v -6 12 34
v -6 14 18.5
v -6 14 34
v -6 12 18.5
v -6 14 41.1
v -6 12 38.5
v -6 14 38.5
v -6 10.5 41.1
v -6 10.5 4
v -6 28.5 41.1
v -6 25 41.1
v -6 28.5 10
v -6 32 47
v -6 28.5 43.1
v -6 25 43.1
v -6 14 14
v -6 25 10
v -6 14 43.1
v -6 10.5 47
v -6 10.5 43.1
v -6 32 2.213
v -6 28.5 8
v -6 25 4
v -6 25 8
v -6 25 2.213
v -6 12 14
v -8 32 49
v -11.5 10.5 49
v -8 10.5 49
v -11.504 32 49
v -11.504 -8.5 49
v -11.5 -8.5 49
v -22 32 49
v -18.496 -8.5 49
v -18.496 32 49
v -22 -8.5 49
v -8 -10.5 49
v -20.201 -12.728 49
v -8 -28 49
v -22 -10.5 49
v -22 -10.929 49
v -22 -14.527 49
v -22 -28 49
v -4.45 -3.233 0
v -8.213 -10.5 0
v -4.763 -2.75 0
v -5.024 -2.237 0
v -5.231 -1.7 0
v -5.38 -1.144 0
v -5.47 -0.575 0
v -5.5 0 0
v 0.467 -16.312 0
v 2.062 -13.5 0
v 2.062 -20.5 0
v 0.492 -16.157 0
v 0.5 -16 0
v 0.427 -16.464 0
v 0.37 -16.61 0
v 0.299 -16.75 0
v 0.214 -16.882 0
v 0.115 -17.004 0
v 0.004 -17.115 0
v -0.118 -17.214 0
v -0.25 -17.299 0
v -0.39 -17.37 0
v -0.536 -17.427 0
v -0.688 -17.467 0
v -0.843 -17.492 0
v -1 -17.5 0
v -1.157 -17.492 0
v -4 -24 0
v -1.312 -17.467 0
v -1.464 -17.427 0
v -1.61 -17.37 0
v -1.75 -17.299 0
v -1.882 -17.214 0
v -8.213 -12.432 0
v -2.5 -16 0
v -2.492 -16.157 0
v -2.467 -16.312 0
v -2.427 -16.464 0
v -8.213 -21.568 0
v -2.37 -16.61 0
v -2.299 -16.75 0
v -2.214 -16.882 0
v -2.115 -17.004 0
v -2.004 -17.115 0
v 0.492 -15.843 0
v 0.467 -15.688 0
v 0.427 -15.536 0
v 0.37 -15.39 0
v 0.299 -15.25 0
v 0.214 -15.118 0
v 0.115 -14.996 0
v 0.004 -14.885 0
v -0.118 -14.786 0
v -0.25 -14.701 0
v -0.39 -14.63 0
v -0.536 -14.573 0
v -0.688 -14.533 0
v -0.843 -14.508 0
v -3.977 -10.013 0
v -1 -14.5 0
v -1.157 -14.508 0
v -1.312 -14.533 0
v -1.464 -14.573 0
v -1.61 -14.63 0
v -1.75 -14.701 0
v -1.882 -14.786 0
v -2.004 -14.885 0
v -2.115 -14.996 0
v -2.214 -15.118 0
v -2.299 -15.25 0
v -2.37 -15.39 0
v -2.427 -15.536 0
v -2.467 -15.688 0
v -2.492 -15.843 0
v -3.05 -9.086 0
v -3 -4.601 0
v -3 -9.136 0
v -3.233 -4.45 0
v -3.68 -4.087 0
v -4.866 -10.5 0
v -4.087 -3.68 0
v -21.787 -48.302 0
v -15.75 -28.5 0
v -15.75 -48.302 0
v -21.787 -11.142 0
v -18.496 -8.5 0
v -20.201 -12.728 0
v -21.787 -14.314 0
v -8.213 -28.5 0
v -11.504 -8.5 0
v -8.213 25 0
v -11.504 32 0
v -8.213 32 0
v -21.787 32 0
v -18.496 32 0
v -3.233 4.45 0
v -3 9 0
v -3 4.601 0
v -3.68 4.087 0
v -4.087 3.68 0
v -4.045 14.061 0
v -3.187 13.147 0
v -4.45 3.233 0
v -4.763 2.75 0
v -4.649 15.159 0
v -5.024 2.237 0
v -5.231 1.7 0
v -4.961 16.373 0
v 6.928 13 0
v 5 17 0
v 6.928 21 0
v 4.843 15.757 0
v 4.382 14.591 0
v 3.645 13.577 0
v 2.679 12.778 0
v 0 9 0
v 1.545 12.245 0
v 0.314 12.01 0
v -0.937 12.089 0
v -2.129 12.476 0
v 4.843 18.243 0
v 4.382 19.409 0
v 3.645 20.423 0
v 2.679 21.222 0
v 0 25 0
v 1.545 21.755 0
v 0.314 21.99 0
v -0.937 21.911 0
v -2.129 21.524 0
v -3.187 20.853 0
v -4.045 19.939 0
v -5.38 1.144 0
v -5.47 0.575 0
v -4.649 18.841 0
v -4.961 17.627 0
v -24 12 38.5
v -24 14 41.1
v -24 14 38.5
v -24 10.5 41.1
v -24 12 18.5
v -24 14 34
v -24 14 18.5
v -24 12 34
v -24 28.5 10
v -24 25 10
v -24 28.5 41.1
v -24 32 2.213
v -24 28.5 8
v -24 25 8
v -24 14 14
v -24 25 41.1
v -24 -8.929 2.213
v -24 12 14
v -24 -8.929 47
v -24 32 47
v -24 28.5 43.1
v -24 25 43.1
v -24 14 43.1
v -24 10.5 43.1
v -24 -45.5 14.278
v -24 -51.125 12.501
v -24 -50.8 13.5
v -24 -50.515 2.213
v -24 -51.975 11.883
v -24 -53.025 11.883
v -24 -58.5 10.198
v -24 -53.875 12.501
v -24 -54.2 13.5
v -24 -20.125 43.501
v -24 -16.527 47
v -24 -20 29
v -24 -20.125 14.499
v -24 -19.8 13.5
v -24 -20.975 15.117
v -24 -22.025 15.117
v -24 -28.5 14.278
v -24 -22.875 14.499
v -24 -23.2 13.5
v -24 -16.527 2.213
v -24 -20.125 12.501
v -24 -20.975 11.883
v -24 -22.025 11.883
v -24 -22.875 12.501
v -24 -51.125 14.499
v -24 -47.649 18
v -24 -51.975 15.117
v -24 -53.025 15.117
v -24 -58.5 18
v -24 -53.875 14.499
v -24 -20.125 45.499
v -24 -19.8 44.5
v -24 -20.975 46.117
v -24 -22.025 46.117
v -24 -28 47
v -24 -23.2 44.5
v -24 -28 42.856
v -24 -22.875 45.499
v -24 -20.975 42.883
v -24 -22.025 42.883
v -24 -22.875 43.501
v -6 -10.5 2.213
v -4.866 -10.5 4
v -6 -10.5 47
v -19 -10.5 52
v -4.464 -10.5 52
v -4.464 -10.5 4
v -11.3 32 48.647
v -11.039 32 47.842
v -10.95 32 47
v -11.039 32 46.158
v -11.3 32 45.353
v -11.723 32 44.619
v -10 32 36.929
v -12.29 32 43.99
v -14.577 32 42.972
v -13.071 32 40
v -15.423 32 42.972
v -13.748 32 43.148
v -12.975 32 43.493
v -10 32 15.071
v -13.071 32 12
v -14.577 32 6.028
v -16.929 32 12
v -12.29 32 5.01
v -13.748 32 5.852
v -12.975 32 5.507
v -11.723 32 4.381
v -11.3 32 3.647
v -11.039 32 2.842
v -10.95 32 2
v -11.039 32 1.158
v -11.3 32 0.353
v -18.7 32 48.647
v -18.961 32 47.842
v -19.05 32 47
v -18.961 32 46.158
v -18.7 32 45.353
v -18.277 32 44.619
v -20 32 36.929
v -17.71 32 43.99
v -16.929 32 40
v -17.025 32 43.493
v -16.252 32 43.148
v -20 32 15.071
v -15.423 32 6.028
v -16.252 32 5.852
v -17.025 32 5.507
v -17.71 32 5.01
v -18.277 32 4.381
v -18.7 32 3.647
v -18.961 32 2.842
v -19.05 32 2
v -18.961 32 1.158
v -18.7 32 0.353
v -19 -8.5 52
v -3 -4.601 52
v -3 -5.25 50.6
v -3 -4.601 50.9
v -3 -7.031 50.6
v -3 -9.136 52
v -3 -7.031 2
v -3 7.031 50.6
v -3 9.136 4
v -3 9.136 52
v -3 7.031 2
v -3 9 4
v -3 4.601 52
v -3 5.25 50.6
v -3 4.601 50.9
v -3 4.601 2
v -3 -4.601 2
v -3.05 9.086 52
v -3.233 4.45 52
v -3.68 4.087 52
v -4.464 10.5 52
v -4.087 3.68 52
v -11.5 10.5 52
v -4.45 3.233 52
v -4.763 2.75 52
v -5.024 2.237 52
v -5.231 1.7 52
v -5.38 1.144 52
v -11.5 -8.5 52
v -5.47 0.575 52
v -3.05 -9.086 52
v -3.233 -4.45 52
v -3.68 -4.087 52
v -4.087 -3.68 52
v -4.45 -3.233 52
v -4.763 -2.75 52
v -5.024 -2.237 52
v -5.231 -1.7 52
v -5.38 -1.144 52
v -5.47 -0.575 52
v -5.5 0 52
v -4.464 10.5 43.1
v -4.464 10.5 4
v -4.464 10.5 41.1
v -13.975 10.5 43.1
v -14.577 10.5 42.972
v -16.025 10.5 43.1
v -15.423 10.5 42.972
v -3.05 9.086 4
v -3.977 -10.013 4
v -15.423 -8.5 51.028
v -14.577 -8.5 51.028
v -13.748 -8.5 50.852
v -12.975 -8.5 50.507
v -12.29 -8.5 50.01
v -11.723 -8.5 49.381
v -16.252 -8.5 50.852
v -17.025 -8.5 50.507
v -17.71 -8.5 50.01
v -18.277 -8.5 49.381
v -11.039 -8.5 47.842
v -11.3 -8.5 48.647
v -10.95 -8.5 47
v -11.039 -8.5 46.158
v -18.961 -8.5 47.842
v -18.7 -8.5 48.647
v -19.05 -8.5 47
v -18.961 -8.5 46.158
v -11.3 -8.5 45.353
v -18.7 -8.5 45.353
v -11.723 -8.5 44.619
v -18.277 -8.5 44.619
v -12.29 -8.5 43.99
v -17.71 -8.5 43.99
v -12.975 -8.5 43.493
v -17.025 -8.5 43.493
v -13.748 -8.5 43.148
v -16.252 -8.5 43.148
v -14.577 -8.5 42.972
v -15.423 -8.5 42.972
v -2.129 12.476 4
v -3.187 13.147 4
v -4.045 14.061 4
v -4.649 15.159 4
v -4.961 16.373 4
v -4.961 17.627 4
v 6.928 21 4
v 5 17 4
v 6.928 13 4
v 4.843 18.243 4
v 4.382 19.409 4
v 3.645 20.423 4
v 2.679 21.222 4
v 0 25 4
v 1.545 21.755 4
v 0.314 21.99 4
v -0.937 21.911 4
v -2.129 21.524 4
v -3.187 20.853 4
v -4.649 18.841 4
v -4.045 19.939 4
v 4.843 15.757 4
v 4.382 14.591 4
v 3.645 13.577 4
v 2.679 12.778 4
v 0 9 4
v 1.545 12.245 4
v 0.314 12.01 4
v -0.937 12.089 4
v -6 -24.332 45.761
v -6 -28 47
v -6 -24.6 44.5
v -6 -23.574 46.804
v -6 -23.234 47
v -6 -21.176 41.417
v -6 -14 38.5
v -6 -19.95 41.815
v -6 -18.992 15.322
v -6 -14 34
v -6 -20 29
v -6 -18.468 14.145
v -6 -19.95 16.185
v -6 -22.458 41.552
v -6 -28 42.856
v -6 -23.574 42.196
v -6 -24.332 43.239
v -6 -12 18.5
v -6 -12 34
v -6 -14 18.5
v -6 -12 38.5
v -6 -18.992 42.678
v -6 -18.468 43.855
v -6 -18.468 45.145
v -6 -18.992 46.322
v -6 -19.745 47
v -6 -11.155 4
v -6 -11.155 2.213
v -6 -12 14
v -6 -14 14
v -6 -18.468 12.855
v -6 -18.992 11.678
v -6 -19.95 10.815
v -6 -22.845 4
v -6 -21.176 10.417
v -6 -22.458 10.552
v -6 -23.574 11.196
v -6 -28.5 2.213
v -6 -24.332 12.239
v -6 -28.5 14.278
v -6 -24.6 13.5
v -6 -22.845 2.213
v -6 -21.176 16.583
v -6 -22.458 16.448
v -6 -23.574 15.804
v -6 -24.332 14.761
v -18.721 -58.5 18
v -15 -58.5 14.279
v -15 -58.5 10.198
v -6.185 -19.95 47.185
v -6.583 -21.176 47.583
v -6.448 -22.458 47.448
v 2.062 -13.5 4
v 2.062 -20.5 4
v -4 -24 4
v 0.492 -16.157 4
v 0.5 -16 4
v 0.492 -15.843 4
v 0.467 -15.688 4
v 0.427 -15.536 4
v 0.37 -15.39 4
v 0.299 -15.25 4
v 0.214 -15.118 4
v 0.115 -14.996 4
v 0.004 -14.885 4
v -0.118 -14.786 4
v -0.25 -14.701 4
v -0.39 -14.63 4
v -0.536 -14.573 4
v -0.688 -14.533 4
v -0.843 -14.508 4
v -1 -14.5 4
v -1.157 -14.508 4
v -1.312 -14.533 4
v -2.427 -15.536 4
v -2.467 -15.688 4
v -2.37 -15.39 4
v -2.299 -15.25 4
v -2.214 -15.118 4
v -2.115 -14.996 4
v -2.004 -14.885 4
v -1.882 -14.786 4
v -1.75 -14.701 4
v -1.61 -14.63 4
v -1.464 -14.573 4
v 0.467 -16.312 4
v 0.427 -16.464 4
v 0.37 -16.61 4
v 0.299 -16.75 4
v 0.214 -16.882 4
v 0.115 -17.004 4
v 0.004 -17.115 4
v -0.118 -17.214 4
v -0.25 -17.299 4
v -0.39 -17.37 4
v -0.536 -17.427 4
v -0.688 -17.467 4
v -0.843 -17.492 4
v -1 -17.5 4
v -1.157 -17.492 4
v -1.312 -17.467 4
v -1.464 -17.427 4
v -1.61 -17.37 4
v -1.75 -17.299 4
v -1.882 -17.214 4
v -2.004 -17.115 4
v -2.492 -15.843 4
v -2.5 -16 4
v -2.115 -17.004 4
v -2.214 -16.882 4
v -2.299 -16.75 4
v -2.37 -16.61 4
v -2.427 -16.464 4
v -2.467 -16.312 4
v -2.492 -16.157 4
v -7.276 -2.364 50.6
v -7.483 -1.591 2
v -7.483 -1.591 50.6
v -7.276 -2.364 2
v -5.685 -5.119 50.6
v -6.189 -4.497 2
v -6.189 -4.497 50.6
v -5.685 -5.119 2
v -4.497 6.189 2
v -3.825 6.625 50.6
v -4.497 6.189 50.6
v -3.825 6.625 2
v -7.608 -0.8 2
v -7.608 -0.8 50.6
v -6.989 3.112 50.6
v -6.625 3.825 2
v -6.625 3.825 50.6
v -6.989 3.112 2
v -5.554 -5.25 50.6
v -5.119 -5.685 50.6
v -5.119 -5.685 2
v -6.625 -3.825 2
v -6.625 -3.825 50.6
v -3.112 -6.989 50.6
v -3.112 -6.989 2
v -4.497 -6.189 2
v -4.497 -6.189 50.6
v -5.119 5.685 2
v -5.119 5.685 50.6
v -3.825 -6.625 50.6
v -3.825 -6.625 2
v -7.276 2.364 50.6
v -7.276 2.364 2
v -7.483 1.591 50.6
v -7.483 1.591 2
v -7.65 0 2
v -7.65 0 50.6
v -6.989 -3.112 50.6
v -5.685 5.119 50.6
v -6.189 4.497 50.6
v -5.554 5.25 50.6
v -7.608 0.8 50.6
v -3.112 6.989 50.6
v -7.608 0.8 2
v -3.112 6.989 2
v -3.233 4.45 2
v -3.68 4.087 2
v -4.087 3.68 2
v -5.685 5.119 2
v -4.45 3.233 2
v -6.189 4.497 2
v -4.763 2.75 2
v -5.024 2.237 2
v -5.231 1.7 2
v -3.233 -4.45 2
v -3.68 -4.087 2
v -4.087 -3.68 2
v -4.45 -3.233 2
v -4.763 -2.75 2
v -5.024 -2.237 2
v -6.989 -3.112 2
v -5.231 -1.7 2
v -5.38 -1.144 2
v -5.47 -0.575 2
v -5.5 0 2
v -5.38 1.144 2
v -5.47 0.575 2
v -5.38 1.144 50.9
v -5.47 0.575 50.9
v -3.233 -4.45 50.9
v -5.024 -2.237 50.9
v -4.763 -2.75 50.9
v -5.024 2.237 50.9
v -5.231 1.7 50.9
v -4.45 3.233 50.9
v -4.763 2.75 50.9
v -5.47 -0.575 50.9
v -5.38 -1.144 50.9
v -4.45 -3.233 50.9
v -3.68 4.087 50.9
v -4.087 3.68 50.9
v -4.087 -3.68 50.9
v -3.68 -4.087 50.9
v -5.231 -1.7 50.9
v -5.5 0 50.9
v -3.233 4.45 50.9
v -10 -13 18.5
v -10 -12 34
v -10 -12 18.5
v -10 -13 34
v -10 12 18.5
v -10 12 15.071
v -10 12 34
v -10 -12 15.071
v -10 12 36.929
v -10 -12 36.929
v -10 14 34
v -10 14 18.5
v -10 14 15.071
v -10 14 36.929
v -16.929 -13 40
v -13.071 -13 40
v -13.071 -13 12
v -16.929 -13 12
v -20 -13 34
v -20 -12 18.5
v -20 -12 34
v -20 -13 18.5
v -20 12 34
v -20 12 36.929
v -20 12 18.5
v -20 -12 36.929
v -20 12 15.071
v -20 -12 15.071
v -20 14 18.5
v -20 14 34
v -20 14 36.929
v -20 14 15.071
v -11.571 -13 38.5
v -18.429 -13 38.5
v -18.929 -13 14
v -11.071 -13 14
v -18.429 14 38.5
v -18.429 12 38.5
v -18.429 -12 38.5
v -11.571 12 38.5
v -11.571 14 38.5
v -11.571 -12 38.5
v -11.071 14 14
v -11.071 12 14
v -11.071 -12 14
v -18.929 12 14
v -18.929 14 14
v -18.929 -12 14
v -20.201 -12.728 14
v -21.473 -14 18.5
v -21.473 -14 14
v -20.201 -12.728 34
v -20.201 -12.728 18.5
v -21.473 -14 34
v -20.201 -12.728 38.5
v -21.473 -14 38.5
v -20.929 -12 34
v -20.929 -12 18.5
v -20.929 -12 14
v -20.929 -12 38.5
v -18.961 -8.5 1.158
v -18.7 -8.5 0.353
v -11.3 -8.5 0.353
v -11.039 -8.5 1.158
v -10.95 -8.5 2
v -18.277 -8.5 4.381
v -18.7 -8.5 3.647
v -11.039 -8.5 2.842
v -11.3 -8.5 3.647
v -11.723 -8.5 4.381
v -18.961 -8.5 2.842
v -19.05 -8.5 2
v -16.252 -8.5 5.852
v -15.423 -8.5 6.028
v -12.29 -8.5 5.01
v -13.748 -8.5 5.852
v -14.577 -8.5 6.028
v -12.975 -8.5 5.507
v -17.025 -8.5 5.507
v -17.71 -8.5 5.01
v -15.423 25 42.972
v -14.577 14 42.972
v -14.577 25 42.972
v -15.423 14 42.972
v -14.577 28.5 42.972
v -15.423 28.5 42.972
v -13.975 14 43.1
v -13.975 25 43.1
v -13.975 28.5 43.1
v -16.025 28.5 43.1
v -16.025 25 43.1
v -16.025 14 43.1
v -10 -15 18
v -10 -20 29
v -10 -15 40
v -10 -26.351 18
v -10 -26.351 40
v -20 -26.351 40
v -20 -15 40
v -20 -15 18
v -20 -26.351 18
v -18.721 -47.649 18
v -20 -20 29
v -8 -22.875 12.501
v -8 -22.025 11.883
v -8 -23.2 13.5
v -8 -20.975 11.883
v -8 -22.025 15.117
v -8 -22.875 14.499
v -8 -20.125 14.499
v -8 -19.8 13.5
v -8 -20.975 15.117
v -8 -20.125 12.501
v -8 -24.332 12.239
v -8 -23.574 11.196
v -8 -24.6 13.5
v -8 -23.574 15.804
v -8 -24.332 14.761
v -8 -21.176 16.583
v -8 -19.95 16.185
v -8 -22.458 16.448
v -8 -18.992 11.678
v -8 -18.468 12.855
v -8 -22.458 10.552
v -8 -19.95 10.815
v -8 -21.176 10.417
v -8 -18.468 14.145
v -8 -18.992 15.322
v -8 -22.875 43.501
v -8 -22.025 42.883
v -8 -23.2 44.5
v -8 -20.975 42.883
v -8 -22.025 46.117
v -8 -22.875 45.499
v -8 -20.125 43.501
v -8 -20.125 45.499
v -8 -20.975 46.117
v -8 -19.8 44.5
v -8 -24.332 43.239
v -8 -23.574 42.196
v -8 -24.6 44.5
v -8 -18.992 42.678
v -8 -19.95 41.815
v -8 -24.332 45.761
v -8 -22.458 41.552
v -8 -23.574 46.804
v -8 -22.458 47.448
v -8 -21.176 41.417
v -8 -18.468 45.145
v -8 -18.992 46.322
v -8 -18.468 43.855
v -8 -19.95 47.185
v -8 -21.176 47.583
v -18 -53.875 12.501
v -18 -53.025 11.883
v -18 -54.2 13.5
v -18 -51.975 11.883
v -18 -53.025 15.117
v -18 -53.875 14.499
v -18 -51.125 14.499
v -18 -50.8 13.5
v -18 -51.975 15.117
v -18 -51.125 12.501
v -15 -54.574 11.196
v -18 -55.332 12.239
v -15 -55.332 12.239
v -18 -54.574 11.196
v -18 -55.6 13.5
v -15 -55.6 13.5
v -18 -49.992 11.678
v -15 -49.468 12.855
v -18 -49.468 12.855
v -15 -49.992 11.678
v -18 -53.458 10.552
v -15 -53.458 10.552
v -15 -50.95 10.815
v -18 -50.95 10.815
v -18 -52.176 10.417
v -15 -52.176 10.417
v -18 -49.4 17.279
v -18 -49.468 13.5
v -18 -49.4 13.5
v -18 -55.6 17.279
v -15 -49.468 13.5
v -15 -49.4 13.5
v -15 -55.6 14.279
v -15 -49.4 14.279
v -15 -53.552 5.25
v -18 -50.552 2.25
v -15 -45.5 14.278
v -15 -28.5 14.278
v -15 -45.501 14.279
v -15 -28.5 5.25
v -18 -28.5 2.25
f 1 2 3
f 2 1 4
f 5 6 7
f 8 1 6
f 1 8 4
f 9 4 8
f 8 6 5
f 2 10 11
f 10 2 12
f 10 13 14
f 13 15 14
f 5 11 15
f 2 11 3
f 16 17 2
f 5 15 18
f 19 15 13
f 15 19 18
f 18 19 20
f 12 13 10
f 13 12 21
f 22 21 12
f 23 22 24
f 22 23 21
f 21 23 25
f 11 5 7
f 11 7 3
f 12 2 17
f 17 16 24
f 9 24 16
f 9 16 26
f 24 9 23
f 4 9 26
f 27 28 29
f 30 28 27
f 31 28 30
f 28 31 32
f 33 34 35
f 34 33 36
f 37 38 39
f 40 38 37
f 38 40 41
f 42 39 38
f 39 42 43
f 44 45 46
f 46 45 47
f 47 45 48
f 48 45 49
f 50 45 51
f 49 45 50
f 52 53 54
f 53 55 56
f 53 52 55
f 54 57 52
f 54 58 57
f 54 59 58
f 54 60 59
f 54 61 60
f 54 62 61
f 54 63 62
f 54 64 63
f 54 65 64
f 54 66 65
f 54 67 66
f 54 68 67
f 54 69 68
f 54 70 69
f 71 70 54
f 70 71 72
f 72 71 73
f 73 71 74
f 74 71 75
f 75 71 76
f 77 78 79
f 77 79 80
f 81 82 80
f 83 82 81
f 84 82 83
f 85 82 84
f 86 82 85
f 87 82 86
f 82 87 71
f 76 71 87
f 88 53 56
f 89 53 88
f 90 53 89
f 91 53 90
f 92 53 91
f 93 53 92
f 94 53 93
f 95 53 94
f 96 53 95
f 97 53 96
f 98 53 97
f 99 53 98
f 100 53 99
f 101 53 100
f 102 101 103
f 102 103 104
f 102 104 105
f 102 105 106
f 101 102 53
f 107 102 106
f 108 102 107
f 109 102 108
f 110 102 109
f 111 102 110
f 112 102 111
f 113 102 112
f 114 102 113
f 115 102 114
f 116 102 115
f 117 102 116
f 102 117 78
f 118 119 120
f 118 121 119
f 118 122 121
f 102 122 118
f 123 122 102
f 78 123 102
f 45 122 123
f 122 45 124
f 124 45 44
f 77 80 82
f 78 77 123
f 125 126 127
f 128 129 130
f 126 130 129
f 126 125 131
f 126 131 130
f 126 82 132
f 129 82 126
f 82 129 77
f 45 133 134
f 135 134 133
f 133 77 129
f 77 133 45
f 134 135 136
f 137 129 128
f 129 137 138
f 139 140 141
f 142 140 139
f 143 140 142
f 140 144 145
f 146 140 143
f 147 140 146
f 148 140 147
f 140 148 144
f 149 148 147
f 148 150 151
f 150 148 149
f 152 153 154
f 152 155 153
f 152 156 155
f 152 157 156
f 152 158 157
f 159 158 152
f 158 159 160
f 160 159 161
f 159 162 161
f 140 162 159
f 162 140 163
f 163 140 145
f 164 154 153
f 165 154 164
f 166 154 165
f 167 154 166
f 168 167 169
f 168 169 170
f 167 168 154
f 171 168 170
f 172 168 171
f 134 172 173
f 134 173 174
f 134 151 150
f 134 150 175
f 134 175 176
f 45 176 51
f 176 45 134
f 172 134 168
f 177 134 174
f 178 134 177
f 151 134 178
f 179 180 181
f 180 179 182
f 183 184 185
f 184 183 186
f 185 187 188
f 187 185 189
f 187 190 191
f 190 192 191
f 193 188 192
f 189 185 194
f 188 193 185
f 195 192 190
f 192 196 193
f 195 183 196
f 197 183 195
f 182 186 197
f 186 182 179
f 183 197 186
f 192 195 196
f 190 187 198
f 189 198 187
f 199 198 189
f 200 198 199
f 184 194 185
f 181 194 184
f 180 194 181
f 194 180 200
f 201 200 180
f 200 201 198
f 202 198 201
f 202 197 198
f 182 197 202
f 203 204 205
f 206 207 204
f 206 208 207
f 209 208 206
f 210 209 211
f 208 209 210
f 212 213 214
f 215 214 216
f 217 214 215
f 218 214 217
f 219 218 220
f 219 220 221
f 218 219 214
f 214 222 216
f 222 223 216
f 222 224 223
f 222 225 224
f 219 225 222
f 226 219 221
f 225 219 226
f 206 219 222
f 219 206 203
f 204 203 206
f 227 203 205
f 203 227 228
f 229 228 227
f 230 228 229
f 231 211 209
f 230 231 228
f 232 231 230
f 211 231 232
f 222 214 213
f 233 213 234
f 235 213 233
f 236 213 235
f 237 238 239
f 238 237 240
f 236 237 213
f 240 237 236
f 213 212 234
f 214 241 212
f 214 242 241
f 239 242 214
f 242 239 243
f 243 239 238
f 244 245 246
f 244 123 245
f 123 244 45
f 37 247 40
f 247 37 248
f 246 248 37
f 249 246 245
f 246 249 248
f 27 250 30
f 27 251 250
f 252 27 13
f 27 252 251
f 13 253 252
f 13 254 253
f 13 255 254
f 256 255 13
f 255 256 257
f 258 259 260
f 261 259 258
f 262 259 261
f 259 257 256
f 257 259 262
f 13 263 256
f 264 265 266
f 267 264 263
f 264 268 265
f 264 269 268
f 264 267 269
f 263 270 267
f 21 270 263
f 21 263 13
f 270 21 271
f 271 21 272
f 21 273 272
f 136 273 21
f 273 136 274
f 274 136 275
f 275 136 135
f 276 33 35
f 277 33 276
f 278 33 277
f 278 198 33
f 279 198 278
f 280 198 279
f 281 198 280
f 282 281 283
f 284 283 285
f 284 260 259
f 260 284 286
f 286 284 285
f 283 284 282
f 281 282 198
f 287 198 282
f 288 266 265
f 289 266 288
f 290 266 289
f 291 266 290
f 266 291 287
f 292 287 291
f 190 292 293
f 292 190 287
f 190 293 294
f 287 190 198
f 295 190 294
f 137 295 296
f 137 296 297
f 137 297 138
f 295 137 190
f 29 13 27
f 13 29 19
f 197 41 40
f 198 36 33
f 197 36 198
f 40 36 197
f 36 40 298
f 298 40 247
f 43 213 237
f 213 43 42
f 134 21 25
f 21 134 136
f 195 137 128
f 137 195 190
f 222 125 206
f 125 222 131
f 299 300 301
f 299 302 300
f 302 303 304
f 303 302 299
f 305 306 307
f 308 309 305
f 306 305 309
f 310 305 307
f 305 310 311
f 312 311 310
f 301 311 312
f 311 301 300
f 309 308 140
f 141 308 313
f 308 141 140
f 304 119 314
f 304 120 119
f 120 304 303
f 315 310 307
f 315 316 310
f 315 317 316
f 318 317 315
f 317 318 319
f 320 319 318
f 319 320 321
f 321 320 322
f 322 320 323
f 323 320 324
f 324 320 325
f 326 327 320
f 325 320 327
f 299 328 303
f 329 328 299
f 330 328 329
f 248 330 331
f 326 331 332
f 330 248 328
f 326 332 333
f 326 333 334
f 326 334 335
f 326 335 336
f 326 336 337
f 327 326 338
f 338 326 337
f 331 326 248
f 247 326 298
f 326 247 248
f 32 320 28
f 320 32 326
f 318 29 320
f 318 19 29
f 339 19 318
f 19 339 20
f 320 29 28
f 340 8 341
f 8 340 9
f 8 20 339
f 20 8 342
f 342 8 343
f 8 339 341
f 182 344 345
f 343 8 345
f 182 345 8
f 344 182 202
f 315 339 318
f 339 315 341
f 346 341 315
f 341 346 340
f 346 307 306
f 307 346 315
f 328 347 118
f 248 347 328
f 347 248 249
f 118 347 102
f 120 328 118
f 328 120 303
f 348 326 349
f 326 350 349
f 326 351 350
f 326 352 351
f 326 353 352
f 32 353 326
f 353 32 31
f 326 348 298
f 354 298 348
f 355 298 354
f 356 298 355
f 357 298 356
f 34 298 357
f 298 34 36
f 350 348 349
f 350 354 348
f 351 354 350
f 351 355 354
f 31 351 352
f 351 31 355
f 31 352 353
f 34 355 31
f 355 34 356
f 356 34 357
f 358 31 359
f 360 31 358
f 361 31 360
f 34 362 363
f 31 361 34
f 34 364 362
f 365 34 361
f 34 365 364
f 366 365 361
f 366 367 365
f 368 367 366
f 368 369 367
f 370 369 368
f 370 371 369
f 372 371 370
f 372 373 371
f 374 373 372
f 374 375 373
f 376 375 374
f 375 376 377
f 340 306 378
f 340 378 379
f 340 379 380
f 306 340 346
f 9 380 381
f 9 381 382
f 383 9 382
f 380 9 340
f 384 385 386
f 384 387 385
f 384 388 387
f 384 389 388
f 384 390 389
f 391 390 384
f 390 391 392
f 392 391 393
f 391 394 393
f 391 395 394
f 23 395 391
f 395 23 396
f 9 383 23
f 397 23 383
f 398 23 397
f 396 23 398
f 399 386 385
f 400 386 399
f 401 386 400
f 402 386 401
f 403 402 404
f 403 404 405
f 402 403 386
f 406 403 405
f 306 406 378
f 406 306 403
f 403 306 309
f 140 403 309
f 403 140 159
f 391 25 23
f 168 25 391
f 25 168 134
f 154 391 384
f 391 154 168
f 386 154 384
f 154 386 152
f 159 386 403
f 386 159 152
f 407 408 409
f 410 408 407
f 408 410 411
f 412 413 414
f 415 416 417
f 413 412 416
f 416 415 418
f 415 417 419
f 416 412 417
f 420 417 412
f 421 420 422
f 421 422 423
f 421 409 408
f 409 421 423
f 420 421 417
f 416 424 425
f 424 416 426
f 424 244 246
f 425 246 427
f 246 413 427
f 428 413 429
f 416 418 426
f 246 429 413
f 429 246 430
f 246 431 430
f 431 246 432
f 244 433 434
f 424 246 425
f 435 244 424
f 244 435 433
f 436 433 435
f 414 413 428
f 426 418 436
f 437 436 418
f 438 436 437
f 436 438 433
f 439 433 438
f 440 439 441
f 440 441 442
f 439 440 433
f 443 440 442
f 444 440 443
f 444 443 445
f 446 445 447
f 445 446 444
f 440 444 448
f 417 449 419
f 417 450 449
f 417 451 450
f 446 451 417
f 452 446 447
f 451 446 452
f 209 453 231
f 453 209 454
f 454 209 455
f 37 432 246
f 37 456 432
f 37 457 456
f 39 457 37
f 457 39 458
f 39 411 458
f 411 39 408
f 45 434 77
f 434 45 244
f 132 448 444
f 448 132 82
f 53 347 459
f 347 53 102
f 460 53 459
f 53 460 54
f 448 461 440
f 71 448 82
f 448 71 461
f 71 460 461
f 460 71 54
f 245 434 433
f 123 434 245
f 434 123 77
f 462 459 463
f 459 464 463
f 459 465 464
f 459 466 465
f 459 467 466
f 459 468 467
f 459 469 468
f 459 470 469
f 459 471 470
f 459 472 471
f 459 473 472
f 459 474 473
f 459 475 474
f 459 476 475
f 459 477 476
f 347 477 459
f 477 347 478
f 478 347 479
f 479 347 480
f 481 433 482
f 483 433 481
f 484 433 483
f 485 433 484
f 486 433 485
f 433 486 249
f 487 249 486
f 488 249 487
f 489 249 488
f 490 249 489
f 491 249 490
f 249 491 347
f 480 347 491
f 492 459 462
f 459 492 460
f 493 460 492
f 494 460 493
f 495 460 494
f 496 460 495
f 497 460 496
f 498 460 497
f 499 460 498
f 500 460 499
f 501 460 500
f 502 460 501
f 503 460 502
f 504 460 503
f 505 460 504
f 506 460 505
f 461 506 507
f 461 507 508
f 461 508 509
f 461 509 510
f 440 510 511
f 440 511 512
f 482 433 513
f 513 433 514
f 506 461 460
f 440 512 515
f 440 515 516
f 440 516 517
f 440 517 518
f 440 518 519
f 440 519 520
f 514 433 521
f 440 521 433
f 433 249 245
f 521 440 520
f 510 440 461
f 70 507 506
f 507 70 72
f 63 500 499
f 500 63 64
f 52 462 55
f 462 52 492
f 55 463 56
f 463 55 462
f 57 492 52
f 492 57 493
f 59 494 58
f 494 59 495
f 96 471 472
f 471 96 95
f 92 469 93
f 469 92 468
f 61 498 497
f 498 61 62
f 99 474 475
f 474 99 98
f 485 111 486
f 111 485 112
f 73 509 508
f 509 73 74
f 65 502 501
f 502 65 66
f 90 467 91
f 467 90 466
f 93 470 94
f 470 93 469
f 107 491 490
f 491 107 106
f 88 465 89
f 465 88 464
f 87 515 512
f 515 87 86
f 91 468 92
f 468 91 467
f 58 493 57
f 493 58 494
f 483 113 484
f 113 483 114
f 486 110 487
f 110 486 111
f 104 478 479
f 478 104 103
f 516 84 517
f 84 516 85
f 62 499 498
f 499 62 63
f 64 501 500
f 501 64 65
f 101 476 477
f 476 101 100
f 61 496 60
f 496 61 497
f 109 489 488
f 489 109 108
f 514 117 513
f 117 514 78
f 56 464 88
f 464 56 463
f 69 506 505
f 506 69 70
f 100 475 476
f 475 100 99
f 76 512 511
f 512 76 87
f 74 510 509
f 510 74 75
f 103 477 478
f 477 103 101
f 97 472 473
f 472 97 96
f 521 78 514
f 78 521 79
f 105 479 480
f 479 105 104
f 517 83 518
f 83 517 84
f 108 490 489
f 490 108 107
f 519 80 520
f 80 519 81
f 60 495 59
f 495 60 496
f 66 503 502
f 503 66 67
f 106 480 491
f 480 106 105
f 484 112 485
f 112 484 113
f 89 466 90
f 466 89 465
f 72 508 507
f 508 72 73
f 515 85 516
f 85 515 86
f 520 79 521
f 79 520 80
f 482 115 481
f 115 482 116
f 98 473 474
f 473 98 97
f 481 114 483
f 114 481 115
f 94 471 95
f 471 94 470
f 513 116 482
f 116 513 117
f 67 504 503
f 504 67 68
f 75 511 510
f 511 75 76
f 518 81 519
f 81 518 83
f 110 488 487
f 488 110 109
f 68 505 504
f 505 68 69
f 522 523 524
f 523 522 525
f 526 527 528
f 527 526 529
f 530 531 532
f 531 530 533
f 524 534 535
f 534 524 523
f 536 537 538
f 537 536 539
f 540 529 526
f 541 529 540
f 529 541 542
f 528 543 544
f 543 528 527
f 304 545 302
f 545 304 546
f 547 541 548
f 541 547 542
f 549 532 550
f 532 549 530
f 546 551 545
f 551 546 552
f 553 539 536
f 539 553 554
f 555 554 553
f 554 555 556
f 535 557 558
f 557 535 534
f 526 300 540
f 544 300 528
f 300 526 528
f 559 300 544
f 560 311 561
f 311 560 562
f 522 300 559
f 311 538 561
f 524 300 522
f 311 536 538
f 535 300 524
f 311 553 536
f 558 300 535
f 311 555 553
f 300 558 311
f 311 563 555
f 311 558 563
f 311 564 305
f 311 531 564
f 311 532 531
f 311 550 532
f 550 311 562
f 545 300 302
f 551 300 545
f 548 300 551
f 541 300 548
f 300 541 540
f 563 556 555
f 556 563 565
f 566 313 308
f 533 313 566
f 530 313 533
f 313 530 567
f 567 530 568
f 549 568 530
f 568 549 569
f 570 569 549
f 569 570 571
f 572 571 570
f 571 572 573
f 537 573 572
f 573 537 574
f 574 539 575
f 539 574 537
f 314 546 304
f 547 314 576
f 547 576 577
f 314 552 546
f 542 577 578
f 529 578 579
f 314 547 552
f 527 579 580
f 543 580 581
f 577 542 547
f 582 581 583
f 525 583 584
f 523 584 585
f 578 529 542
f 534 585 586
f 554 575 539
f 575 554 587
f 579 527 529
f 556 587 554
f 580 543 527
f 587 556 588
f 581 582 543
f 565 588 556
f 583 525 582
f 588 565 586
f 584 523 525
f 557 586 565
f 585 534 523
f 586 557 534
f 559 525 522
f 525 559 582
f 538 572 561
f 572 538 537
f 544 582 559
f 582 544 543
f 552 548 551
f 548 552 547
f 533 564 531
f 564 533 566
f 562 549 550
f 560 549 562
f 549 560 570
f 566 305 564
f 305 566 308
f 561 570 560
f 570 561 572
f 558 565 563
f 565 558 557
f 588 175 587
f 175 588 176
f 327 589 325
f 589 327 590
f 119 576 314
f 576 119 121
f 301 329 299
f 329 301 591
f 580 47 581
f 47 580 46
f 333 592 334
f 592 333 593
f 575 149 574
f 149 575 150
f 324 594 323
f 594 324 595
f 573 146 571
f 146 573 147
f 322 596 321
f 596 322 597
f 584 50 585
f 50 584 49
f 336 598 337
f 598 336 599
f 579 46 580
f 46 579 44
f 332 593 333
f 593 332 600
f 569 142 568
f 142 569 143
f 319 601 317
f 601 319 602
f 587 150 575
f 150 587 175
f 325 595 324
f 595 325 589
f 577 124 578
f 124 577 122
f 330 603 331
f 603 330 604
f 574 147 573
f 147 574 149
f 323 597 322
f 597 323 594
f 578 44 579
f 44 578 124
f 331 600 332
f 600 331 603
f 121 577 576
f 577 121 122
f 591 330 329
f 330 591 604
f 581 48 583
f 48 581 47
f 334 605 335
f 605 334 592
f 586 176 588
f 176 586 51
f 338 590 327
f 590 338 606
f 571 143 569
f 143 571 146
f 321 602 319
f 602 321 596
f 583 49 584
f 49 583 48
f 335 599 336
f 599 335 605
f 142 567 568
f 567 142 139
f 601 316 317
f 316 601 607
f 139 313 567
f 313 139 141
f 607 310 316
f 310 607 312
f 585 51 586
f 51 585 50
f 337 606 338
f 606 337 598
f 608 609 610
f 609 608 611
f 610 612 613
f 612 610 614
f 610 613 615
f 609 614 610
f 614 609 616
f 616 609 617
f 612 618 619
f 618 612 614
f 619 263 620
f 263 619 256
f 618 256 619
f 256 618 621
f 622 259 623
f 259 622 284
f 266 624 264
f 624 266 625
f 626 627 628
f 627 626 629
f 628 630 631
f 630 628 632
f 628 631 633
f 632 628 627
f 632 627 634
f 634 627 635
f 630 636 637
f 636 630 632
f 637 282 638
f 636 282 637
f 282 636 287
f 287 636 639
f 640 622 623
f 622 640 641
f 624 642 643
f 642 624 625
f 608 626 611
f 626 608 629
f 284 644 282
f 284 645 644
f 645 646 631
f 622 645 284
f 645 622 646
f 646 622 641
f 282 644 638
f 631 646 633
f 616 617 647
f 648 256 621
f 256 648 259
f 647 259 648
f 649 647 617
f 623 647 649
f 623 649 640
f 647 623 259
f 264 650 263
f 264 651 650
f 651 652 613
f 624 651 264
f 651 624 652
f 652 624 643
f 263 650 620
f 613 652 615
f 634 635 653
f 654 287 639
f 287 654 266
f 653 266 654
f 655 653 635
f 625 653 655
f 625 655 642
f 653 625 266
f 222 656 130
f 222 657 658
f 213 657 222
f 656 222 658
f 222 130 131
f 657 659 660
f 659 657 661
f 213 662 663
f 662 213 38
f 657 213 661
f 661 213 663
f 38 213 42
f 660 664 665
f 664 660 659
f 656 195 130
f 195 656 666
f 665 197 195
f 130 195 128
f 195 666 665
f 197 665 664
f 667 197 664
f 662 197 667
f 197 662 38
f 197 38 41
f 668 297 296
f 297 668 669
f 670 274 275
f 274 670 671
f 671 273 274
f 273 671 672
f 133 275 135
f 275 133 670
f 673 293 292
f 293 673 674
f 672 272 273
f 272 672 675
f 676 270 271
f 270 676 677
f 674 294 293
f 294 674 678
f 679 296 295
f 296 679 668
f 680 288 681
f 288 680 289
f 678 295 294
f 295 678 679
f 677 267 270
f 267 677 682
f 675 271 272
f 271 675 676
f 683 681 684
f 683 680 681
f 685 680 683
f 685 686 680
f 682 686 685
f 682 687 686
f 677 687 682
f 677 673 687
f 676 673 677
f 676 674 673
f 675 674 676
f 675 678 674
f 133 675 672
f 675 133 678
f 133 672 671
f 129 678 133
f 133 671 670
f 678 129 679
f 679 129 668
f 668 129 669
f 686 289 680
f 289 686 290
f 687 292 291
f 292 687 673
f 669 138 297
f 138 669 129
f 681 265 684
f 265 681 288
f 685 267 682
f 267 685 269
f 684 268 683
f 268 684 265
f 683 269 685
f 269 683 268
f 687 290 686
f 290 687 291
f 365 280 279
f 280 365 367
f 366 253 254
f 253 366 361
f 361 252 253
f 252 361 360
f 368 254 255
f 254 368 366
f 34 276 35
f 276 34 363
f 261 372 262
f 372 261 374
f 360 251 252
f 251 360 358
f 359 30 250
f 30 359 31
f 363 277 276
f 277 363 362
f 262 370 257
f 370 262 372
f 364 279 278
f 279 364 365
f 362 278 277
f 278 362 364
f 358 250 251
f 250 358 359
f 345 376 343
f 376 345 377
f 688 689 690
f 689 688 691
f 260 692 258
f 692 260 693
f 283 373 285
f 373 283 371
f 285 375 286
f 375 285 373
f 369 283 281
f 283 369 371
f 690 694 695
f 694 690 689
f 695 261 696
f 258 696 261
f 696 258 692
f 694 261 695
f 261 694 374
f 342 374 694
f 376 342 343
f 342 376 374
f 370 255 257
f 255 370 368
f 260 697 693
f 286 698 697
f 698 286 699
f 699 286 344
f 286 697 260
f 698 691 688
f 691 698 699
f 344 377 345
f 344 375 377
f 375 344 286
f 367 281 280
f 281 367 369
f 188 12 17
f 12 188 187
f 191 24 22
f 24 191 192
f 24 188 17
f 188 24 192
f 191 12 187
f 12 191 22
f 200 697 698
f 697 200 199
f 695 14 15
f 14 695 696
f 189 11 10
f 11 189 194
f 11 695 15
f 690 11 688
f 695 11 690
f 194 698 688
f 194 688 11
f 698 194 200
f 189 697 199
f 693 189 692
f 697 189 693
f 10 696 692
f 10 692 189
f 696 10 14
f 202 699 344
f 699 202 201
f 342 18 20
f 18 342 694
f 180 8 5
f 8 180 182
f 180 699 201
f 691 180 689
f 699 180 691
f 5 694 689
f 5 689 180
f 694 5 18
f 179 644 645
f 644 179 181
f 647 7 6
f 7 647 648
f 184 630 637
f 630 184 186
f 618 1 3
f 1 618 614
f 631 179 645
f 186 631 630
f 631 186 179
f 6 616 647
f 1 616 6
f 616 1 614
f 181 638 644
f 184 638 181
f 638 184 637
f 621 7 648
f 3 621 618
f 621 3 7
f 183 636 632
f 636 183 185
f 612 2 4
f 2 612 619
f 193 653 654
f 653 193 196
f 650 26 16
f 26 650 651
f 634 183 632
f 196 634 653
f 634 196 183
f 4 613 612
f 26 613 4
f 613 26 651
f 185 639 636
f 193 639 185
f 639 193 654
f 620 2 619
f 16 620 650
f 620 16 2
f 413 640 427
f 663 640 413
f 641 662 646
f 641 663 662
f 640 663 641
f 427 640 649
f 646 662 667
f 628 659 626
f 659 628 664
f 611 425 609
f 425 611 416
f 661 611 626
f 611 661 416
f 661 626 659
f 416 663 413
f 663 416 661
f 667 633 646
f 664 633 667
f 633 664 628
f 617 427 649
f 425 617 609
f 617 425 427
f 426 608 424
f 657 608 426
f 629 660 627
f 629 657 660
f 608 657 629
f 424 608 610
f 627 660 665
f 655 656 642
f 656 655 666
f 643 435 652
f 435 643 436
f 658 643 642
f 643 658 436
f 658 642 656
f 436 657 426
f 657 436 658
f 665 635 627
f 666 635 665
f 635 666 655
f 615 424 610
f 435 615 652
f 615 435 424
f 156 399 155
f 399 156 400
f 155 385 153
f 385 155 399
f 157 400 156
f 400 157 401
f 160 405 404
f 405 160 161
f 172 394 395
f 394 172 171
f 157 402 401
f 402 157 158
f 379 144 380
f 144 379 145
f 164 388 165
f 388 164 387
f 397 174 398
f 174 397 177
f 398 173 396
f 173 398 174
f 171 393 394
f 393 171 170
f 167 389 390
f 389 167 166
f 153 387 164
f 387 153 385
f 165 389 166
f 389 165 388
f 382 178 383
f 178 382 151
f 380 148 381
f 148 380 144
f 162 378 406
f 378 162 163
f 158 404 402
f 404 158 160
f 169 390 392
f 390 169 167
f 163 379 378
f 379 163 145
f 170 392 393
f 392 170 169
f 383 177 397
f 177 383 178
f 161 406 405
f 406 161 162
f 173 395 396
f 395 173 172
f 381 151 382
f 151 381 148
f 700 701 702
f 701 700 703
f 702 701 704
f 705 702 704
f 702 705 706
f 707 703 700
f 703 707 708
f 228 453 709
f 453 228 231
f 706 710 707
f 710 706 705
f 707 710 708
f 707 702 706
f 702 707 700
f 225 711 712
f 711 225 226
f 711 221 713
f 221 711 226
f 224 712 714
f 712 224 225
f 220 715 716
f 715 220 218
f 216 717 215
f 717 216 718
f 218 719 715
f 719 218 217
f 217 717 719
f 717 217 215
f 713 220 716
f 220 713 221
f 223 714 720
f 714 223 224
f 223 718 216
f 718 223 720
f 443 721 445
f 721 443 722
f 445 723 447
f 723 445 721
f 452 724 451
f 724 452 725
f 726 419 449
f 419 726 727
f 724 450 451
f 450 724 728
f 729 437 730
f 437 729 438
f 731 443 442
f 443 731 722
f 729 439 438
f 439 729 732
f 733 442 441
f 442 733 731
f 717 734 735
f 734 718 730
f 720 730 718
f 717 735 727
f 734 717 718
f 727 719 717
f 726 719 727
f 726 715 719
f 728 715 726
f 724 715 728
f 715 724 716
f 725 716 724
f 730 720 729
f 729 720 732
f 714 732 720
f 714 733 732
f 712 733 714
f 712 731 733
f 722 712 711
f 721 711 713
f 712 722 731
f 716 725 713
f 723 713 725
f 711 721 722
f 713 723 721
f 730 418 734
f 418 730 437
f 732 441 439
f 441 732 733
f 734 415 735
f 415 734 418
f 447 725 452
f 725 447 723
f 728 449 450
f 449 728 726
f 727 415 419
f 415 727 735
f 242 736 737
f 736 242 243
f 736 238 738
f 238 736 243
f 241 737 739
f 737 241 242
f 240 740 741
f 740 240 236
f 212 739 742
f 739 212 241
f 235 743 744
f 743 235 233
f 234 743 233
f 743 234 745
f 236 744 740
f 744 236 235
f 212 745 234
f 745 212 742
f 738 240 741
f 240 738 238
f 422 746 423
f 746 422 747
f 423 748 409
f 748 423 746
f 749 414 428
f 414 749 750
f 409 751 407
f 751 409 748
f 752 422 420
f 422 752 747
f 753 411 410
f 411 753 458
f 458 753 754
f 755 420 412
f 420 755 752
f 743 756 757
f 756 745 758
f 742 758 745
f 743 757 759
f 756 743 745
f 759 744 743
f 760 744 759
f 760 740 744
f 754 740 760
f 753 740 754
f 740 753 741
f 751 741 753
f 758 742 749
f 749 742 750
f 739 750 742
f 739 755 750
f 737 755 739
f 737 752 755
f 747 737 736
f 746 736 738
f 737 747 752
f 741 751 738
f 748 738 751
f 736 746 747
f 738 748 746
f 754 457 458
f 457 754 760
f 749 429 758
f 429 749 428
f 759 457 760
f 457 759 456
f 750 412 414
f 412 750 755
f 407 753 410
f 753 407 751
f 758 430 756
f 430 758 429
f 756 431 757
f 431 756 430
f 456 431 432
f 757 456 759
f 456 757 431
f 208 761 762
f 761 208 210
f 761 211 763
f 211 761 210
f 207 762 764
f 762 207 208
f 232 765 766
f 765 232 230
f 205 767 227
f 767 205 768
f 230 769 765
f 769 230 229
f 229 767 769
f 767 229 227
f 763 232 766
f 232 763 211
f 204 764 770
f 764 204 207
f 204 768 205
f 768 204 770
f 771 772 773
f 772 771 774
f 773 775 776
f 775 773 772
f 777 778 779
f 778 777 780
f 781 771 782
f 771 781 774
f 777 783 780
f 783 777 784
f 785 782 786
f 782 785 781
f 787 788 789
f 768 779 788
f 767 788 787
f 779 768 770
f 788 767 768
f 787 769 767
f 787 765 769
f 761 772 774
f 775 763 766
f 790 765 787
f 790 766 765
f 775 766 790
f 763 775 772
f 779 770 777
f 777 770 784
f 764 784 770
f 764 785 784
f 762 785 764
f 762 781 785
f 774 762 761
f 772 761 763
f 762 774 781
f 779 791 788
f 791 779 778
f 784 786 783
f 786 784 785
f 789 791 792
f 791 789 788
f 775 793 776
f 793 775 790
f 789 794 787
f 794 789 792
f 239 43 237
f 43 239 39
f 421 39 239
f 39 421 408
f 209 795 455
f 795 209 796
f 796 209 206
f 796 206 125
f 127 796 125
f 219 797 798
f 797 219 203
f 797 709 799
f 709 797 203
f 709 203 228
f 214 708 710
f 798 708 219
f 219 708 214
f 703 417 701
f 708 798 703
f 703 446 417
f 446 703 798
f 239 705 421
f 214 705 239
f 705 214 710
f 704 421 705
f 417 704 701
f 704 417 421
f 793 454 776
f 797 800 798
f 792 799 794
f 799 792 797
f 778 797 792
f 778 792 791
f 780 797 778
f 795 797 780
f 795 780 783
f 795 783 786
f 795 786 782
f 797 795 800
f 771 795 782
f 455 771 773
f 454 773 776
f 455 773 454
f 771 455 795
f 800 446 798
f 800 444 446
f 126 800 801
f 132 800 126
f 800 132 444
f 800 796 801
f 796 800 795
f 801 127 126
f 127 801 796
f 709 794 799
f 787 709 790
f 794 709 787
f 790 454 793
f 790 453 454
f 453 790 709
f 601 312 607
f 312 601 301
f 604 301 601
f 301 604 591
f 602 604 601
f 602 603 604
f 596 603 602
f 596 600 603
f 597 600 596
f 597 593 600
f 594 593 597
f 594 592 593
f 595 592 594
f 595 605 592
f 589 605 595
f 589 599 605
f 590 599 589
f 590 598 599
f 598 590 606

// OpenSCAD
// file: inc/bearing.scad
// PRUSA iteration3
// Bearing holders
// GNU GPL v3
// Josef Průša <iam@josefprusa.cz> and contributors
// http://www.reprap.org/wiki/Prusa_Mendel
// http://prusamendel.org

bearing_diameter = 15;
thinwall = 3;
bearing_size = bearing_diameter + 2 * thinwall;
tolerance = 0.15;
bearing_height = 52;

module horizontal_bearing_base(bearings=1) {
  translate(v=[0,0,6]) cube(size = [24,8+bearings*25,12], center = true);
}

module horizontal_bearing_holes(bearings=1) {
  cutter_lenght = 10+bearings*25;
  one_holder_lenght = 8+25;
  holder_lenght = 8+bearings*25;

  // Main bearing cut
  difference() {
    translate(v = [0,0,12]) rotate(a = [90,0,0]) translate(v = [0,0,-cutter_lenght/2]) cylinder(h = cutter_lenght, r = bearing_diameter/2, $fn = 50);
    // Bearing retainers
    translate(v=[0,1-holder_lenght/2,3]) cube(size = [24,6,8], center = true);
    translate(v=[0,-1+holder_lenght/2,3]) cube(size = [24,6,8], center = true);
  }

  // Ziptie cutouts
  ziptie_cut_ofset = 0;

  for (i = [0:bearings-1]) {
    // For easier positioning I move them by half of one
    // bearing holder then add each bearign lenght and then center again
    translate(v = [0,-holder_lenght/2,0]) translate(v = [0,one_holder_lenght/2+i*25,0]) difference(){
      union(){
        translate(v = [0,2-6,12]) rotate(a = [90,0,0]) translate(v = [0,0,0]) cylinder(h = 4, r = 12.5, $fn = 50);
        translate(v = [0,2+6,12]) rotate(a = [90,0,0]) translate(v = [0,0,0]) cylinder(h = 4, r = 12.5, $fn = 50);
      }
      translate(v = [0,10,12]) rotate(a = [90,0,0]) translate(v = [0,0,0]) cylinder(h = 24, r = 10, $fn = 50);
    }
  }
}

module horizontal_bearing_test() {
  difference(){
    horizontal_bearing_base(1);
    horizontal_bearing_holes(1);
  }
  translate(v=[30,0,0]) difference(){
    horizontal_bearing_base(2);
    horizontal_bearing_holes(2);
  }
  translate(v=[60,0,0]) difference(){
    horizontal_bearing_base(3);
    horizontal_bearing_holes(3);
  }
}



module vertical_bearing_base(height) {
  translate(v = [-bearing_size/2-3,bearing_size/2-1,height-2.5]) cube(size = [17,2,5], center = true);
  difference(){
  translate(v = [-2-bearing_size/4,0,height/2]) cube(size = [bearing_size/2-2,bearing_size,height], center = true);
  //cylinder(h = height, r=bearing_size/2, $fn = 90);
    //nice edge
   translate (v = [2.2-bearing_size/4,-bearing_size/2,height/2]) rotate ([0,0,45]) cube(size=[2,2,60],center=true);
   translate (v = [2.2-bearing_size/4,bearing_size/2,height/2]) rotate ([0,0,45]) cube(size=[2,2,60],center=true);  //translate(v = [-2-bearing_size/4,0,height/2]) 
  }    
}

module vertical_bearing_holes(height) {
  
  translate(v = [0,0,2]) cylinder(h = height+tolerance*2, r = bearing_diameter/2+tolerance, $fn = 60);
    //translate(v = [-bearing_diameter/2,0,height/2]) cube([4,bearing_diameter+2,10], center = true);
   translate(v = [0,0,-2]) cylinder(h = height*2, r = bearing_diameter/2-2, $fn = 60);
  
}

difference() {
  vertical_bearing_base(bearing_height);
  vertical_bearing_holes(bearing_height-3.70);
    
 }
translate(v = [-2-bearing_size/4,0,bearing_height-2]) cube(size = [bearing_size/2-2,bearing_size/2,tolerance*2], center = true) ;
//vertical_bearing_holes(50);
// file: inc/x-end.scad
// PRUSA iteration3
// X end prototype
// GNU GPL v3
// Josef Průša <iam@josefprusa.cz> and contributors
// http://www.reprap.org/wiki/Prusa_Mendel
// http://prusamendel.org

use <bearing.scad>
rod_distance = 45;
m5_tolerance = 0.3;
//bearings
bearing_diameter = 15;
thinwall = 3;
bearing_size = bearing_diameter + 2 * thinwall;
tolerance = 0.15;
bearing_height = 52;
smooth_rod_diam=8;
smooth_rod_diam_tolerance=0.1;

module x_end_base() {
  // Main block
  height = 49;

  difference() {
    translate(v = [-15,-9-3.5/2,height/2]) cube(size = [18,39+3.5,height], center = true);
    // Top corners cutouts
    translate([-15+7,-20,51-2]) rotate([0,45,0]) translate([-15,-15,0]) cube([30,60,30]);
    translate([-15-18+11,-20,51-2]) rotate([0,-45,0]) translate([-15,-15,0]) cube([30,60,30]);
    // Bottom corners cutout
    translate([-15+7,-20,-19-2]) rotate([0,45,0]) translate([-15,-15,0]) cube([30,60,30]);
    translate([-15-18+11,-20,-19-2]) rotate([0,-45,0]) translate([-15,-15,0]) cube([30,60,30]);
  }

  // Bearing holder
  difference(){
    vertical_bearing_base(bearing_height);
        translate([-15-18+11,-20,51-2]) rotate([0,-45,0]) translate([-15,-15,0]) cube([30,60,30]);
  
  }
  // Nut trap
  // Cube
  translate(v = [-2-2-1,-17,2]) cube(size = [8+2,16,4], center = true);
  // Hexagon
  translate(v = [0,-17,0]) rotate([0,0,30]) cylinder(h = 4, r = 8, $fn = 6);
}

module x_end_holes() {
  vertical_bearing_holes(bearing_height-3.70);

  // Belt hole
  translate(v = [-1,0,-4])

  difference() {
    translate(v = [-5.5-10+1.5,-10,30]) cube(size = [10,46,28], center = true);

  	// Nice edges
  	translate(v = [-5.5-10+1.5,-10,30+23]) rotate([0,45,0]) cube(size = [10,46,28], center = true);
  	translate(v = [-5.5-10+1.5,-10,30+23]) rotate([0,-45,0]) cube(size = [10,46,28], center = true);
  	translate(v = [-5.5-10+1.5,-10,30-23]) rotate([0,45,0]) cube(size = [10,46,28], center = true);
  	translate(v = [-5.5-10+1.5,-10,30-23]) rotate([0,-45,0]) cube(size = [10,46,28], center = true);
      
      

}
translate(v = [-40,0,25]) rotate([0,0,45]) cube(size = [46,10,56], center = true);
  // Bottom pushfit rod
  translate(v = [-15,-41.5,2]) rotate(a = [-90,0,0]) pushfit_rod(smooth_rod_diam+smooth_rod_diam_tolerance,50);

  // Top pushfit rod
  translate(v = [-15,-41.5,rod_distance+2]) rotate(a = [-90,0,0]) pushfit_rod(smooth_rod_diam+smooth_rod_diam_tolerance,50);

  // Ziptie for holding smooth rods
  translate([-30,-28.5,8]) cube([30,3.5,2]);
  translate([-30,-28.5,49-6-1.9]) cube([30,3.5,2]);
  translate([-30,-14,49-6-1.9]) cube([30,3.5,2]);


  // Ziptie for holding bearings
  translate([-30,-14,bearing_height-2-16]) cube([30,2,4.5]);
  translate([-30,-14,2+12]) cube([30,2,4.5]);
  translate([-30,+12,bearing_height-2-16]) cube([30,2,4.5]);
  translate([-30,+12,2+12]) cube([30,2,4.5]);

  // Nut trap removed : leadswcrew is free! 
  translate(v = [0,-17,-0.5]) cylinder(h = 15, r = 5, $fn = 25);
  //translate(v = [0,-17,3]) rotate([0,0,30]) cylinder(h = 10, r=4.5+m5_tolerance/2, $fn = 6);
}

// Final prototype
module x_end_plain() {
  difference() {
    x_end_base();
    x_end_holes();
  }
  //embedded support for top bearing cap:
  translate(v = [-2-bearing_size/4,0,bearing_height-1.25 ]) cube(size = [bearing_size/2-2,bearing_size/2,tolerance*2], center = true) ;

}

x_end_plain();

module pushfit_rod(diameter,length) {
  cylinder(h = length, r = diameter/2, $fn = 30);
  /*difference() {
 	  translate(v = [0,-diameter/2.85,length/2]) rotate([0,0,45]) cube(size = [diameter/2,diameter/2,length], center = true);
 	  translate(v = [0,-diameter/4-diameter/2-0.4,length/2]) rotate([0,0,0]) cube(size = [diameter,diameter/2,length], center = true);
  }*/
  //translate(v=[0,-diameter/2-2,length/2]) cube(size = [diameter,1,length], center = true);
}
// main file
// PRUSA iteration3
// X end motor
// GNU GPL v3
// Josef Průša <iam@josefprusa.cz> and contributors
// http://www.reprap.org/wiki/Prusa_Mendel
// http://prusamendel.org

use <inc/x-end.scad>
bearing_diameter = 15;
thinwall = 3;
bearing_size = bearing_diameter + 2 * thinwall;
tolerance = 0.15;
bearing_height = 52;
smooth_rod_diam=8;
smooth_rod_diam_tolerance=0.1;
module x_end_motor_base() {
  x_end_base();
  difference() {
    translate(v = [-15,31,26.5-2]) cube(size = [18,55,49], center = true);
  translate([-15+7,0,51-2]) rotate([0,45,0]) translate([-15,-15,0]) cube([30,60,30]);
    translate([-15-18+11,0,51-2]) rotate([0,-45,0]) translate([-15,-15,0]) cube([30,60,30]);
    // Bottom corners cutout
    translate([-15+7,10,-19-2]) rotate([0,45,0]) translate([-15,-15,0]) cube([30,60,30]);
    translate([-15-18+11,10,-19-2]) rotate([0,-45,0]) translate([-15,-15,0]) cube([30,60,30]);
  }
    translate(v = [-4,17,0]) {
        difference(){
            rotate([0,0,30]) cylinder(h = 4, r = 7, $fn = 6);
            translate(v = [3,-1,-1]) cylinder(h = 10, r = 1.5, $fn = 60);
        }
    }

}

module x_end_motor_holes() {
  x_end_holes();
  // Hexagon
  // Position to place
  translate(v = [-1,37,30.25-1.25]) {
    // Belt hole
    translate(v = [-14,1,0]) cube(size = [10,46,22], center = true);

    // Motor mounting holes
    translate(v = [20,-15.5,-15.5]) rotate(a = [0,-90,0]) rotate(a = [0,0,90]) cylinder(h = 70, r = 1.7, $fn = 10);
    translate(v = [3,-15.5,-15.5]) rotate(a = [0,-90,0]) rotate(a = [0,0,90]) cylinder(h = 10, r = 3.1, $fn = 15);

    translate(v = [20,-15.5,15.5]) rotate(a = [0,-90,0]) rotate(a = [0,0,90]) cylinder(h = 70, r = 1.7, $fn = 10);
    translate(v = [3,-15.5,15.5]) rotate(a = [0,-90,0]) rotate(a = [0,0,90]) cylinder(h = 10, r = 3.1, $fn = 15);

    translate(v = [20,15.5,-15.5]) rotate(a = [0,-90,0]) rotate(a = [0,0,90]) cylinder(h = 70, r = 1.7, $fn = 10);
    translate(v = [3-10,15.5,-15.5]) rotate(a = [0,-90,0]) rotate(a = [0,0,90]) cylinder(h = 10, r = 3.1, $fn = 15);
    translate(v = [3-10-2-3,15.5,-15.5+3.1]) cube([10,3.1*2,3.1*2], center = true);

    //translate(v=[20,15.5,15.5]) rotate(a=[0,-90,0]) rotate(a=[0,0,90]) cylinder(h = 70, r=1.7, $fn=10);
    //translate(v=[3.5,15.5,15.5]) rotate(a=[0,-90,0]) rotate(a=[0,0,90]) cylinder(h = 10, r=3.1, $fn=15);

    // Material saving cutout
    translate(v = [-10,12,10]) cube(size = [60,42,42], center = true);

    // Material saving cutout
    translate(v = [-10,40,-30]) rotate(a = [45,0,0])  cube(size = [60,42,42], center = true);

    // Motor shaft cutout
    translate(v = [0,0,0]) rotate(a = [0,-90,0]) rotate(a = [0,0,90]) cylinder(h = 70, r = 17, $fn = 6);

    translate(v = [-14,-8.5,-30]) cube([11,50,20]);
    translate([-15-2,-8.5,-19-7.75]) rotate([0,45,0]) cube([30,60,30]);
    translate(v = [0,15,-4-3.9]) rotate(a = [0,-90+45,0]) rotate(a = [0,0,90]) cylinder(h = 70, r = 17, $fn = 6);
  }
}

// Final part
module x_end_motor() {
  mirror([0,1,0]) difference(){
      
    x_end_motor_base();
    x_end_motor_holes();
  }
}

x_end_motor();
//embedded support for top bearing cap:
  translate(v = [-2-bearing_size/4,0,bearing_height-1.25 ]) cube(size = [bearing_size/2-2,bearing_size/2,tolerance*2], center = true) ;
